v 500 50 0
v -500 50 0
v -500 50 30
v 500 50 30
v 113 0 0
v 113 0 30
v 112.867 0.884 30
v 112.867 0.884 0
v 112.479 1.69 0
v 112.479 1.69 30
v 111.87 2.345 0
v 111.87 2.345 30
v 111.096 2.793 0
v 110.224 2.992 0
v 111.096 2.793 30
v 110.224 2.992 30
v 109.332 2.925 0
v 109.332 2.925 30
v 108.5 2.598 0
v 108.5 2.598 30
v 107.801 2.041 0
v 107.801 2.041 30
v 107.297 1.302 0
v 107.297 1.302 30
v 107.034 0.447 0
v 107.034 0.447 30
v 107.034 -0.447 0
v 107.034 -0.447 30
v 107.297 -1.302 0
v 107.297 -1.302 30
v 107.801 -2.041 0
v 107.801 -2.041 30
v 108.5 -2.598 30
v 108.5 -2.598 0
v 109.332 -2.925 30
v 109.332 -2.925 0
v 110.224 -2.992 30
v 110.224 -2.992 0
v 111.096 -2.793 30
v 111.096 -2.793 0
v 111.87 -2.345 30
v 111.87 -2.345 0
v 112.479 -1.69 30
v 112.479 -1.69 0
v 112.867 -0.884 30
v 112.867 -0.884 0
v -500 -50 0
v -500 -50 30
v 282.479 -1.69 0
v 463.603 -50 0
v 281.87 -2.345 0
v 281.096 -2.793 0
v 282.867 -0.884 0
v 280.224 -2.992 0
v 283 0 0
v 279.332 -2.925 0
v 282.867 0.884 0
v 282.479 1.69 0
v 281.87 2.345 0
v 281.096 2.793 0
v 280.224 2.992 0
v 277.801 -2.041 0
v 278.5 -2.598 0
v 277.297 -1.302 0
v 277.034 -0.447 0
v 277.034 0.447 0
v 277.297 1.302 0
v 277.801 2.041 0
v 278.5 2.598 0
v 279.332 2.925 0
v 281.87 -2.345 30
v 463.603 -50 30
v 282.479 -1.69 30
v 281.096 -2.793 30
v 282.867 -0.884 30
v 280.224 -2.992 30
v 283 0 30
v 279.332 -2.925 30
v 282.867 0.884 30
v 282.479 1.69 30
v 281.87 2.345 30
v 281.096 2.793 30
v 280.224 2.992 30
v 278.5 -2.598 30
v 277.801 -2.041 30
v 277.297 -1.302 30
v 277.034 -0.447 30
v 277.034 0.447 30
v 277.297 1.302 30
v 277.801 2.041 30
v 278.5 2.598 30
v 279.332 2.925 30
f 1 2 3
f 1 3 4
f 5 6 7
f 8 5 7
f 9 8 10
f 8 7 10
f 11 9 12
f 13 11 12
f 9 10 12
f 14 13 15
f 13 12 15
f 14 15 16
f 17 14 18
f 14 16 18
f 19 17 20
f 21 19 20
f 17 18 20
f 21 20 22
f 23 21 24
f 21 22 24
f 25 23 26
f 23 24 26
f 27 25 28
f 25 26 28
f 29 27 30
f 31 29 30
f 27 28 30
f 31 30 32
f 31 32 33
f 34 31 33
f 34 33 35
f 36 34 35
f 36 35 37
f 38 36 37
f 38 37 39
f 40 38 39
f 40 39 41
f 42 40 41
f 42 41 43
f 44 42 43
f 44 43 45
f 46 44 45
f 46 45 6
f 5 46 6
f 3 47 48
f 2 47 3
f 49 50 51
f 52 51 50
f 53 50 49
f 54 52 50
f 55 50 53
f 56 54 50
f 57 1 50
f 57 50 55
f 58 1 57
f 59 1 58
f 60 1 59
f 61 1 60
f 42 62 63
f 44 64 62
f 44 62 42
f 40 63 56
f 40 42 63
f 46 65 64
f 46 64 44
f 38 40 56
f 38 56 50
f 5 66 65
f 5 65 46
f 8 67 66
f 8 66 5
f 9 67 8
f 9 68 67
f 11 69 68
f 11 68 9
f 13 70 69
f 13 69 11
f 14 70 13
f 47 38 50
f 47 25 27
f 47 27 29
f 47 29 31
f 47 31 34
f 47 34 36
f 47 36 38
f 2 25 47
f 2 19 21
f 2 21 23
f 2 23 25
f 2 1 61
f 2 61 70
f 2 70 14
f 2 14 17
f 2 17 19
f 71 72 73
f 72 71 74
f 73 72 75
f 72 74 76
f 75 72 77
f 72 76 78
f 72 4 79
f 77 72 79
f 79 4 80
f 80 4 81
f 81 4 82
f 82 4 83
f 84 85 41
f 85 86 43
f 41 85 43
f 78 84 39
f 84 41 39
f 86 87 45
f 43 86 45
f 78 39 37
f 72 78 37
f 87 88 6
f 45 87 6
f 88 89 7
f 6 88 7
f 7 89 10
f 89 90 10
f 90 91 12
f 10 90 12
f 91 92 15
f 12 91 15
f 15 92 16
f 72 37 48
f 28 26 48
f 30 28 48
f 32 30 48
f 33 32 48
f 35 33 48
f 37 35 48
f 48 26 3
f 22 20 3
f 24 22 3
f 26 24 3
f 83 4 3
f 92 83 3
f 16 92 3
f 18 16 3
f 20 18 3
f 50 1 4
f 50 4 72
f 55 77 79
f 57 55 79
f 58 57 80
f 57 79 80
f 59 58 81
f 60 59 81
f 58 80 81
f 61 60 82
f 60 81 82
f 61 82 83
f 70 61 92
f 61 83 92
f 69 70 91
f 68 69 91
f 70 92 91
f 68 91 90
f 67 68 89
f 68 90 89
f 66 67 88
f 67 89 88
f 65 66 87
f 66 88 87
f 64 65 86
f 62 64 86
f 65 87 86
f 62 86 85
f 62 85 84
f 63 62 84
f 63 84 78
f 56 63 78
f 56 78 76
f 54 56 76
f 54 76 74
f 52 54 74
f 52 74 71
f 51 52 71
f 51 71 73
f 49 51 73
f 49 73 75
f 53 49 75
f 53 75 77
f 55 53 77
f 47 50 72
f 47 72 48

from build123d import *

# Parameters (mm, degrees)
BOSS_EXTRUDE1_DEPTH = 30
SKETCH3_R           = 3
CUT_EXTRUDE2_DEPTH  = 504.388517946


with BuildPart() as part:
    # Sketch1 → Boss-Extrude1 (new body)
    with BuildSketch(Plane.XY):
        Polygon((500, 50), (463.602976573, -50), (-500, -50), (-500, 50), align=None)
    extrude(amount=BOSS_EXTRUDE1_DEPTH)

    # Sketch3 → Cut-Extrude2 (cut, through all)
    with BuildSketch(Plane.XY.offset(30)):
        with Locations((110, 0)):
            Circle(SKETCH3_R)
        with Locations((280, 0)):
            Circle(SKETCH3_R)
    extrude(amount=-CUT_EXTRUDE2_DEPTH, mode=Mode.SUBTRACT)


solid = part.part
